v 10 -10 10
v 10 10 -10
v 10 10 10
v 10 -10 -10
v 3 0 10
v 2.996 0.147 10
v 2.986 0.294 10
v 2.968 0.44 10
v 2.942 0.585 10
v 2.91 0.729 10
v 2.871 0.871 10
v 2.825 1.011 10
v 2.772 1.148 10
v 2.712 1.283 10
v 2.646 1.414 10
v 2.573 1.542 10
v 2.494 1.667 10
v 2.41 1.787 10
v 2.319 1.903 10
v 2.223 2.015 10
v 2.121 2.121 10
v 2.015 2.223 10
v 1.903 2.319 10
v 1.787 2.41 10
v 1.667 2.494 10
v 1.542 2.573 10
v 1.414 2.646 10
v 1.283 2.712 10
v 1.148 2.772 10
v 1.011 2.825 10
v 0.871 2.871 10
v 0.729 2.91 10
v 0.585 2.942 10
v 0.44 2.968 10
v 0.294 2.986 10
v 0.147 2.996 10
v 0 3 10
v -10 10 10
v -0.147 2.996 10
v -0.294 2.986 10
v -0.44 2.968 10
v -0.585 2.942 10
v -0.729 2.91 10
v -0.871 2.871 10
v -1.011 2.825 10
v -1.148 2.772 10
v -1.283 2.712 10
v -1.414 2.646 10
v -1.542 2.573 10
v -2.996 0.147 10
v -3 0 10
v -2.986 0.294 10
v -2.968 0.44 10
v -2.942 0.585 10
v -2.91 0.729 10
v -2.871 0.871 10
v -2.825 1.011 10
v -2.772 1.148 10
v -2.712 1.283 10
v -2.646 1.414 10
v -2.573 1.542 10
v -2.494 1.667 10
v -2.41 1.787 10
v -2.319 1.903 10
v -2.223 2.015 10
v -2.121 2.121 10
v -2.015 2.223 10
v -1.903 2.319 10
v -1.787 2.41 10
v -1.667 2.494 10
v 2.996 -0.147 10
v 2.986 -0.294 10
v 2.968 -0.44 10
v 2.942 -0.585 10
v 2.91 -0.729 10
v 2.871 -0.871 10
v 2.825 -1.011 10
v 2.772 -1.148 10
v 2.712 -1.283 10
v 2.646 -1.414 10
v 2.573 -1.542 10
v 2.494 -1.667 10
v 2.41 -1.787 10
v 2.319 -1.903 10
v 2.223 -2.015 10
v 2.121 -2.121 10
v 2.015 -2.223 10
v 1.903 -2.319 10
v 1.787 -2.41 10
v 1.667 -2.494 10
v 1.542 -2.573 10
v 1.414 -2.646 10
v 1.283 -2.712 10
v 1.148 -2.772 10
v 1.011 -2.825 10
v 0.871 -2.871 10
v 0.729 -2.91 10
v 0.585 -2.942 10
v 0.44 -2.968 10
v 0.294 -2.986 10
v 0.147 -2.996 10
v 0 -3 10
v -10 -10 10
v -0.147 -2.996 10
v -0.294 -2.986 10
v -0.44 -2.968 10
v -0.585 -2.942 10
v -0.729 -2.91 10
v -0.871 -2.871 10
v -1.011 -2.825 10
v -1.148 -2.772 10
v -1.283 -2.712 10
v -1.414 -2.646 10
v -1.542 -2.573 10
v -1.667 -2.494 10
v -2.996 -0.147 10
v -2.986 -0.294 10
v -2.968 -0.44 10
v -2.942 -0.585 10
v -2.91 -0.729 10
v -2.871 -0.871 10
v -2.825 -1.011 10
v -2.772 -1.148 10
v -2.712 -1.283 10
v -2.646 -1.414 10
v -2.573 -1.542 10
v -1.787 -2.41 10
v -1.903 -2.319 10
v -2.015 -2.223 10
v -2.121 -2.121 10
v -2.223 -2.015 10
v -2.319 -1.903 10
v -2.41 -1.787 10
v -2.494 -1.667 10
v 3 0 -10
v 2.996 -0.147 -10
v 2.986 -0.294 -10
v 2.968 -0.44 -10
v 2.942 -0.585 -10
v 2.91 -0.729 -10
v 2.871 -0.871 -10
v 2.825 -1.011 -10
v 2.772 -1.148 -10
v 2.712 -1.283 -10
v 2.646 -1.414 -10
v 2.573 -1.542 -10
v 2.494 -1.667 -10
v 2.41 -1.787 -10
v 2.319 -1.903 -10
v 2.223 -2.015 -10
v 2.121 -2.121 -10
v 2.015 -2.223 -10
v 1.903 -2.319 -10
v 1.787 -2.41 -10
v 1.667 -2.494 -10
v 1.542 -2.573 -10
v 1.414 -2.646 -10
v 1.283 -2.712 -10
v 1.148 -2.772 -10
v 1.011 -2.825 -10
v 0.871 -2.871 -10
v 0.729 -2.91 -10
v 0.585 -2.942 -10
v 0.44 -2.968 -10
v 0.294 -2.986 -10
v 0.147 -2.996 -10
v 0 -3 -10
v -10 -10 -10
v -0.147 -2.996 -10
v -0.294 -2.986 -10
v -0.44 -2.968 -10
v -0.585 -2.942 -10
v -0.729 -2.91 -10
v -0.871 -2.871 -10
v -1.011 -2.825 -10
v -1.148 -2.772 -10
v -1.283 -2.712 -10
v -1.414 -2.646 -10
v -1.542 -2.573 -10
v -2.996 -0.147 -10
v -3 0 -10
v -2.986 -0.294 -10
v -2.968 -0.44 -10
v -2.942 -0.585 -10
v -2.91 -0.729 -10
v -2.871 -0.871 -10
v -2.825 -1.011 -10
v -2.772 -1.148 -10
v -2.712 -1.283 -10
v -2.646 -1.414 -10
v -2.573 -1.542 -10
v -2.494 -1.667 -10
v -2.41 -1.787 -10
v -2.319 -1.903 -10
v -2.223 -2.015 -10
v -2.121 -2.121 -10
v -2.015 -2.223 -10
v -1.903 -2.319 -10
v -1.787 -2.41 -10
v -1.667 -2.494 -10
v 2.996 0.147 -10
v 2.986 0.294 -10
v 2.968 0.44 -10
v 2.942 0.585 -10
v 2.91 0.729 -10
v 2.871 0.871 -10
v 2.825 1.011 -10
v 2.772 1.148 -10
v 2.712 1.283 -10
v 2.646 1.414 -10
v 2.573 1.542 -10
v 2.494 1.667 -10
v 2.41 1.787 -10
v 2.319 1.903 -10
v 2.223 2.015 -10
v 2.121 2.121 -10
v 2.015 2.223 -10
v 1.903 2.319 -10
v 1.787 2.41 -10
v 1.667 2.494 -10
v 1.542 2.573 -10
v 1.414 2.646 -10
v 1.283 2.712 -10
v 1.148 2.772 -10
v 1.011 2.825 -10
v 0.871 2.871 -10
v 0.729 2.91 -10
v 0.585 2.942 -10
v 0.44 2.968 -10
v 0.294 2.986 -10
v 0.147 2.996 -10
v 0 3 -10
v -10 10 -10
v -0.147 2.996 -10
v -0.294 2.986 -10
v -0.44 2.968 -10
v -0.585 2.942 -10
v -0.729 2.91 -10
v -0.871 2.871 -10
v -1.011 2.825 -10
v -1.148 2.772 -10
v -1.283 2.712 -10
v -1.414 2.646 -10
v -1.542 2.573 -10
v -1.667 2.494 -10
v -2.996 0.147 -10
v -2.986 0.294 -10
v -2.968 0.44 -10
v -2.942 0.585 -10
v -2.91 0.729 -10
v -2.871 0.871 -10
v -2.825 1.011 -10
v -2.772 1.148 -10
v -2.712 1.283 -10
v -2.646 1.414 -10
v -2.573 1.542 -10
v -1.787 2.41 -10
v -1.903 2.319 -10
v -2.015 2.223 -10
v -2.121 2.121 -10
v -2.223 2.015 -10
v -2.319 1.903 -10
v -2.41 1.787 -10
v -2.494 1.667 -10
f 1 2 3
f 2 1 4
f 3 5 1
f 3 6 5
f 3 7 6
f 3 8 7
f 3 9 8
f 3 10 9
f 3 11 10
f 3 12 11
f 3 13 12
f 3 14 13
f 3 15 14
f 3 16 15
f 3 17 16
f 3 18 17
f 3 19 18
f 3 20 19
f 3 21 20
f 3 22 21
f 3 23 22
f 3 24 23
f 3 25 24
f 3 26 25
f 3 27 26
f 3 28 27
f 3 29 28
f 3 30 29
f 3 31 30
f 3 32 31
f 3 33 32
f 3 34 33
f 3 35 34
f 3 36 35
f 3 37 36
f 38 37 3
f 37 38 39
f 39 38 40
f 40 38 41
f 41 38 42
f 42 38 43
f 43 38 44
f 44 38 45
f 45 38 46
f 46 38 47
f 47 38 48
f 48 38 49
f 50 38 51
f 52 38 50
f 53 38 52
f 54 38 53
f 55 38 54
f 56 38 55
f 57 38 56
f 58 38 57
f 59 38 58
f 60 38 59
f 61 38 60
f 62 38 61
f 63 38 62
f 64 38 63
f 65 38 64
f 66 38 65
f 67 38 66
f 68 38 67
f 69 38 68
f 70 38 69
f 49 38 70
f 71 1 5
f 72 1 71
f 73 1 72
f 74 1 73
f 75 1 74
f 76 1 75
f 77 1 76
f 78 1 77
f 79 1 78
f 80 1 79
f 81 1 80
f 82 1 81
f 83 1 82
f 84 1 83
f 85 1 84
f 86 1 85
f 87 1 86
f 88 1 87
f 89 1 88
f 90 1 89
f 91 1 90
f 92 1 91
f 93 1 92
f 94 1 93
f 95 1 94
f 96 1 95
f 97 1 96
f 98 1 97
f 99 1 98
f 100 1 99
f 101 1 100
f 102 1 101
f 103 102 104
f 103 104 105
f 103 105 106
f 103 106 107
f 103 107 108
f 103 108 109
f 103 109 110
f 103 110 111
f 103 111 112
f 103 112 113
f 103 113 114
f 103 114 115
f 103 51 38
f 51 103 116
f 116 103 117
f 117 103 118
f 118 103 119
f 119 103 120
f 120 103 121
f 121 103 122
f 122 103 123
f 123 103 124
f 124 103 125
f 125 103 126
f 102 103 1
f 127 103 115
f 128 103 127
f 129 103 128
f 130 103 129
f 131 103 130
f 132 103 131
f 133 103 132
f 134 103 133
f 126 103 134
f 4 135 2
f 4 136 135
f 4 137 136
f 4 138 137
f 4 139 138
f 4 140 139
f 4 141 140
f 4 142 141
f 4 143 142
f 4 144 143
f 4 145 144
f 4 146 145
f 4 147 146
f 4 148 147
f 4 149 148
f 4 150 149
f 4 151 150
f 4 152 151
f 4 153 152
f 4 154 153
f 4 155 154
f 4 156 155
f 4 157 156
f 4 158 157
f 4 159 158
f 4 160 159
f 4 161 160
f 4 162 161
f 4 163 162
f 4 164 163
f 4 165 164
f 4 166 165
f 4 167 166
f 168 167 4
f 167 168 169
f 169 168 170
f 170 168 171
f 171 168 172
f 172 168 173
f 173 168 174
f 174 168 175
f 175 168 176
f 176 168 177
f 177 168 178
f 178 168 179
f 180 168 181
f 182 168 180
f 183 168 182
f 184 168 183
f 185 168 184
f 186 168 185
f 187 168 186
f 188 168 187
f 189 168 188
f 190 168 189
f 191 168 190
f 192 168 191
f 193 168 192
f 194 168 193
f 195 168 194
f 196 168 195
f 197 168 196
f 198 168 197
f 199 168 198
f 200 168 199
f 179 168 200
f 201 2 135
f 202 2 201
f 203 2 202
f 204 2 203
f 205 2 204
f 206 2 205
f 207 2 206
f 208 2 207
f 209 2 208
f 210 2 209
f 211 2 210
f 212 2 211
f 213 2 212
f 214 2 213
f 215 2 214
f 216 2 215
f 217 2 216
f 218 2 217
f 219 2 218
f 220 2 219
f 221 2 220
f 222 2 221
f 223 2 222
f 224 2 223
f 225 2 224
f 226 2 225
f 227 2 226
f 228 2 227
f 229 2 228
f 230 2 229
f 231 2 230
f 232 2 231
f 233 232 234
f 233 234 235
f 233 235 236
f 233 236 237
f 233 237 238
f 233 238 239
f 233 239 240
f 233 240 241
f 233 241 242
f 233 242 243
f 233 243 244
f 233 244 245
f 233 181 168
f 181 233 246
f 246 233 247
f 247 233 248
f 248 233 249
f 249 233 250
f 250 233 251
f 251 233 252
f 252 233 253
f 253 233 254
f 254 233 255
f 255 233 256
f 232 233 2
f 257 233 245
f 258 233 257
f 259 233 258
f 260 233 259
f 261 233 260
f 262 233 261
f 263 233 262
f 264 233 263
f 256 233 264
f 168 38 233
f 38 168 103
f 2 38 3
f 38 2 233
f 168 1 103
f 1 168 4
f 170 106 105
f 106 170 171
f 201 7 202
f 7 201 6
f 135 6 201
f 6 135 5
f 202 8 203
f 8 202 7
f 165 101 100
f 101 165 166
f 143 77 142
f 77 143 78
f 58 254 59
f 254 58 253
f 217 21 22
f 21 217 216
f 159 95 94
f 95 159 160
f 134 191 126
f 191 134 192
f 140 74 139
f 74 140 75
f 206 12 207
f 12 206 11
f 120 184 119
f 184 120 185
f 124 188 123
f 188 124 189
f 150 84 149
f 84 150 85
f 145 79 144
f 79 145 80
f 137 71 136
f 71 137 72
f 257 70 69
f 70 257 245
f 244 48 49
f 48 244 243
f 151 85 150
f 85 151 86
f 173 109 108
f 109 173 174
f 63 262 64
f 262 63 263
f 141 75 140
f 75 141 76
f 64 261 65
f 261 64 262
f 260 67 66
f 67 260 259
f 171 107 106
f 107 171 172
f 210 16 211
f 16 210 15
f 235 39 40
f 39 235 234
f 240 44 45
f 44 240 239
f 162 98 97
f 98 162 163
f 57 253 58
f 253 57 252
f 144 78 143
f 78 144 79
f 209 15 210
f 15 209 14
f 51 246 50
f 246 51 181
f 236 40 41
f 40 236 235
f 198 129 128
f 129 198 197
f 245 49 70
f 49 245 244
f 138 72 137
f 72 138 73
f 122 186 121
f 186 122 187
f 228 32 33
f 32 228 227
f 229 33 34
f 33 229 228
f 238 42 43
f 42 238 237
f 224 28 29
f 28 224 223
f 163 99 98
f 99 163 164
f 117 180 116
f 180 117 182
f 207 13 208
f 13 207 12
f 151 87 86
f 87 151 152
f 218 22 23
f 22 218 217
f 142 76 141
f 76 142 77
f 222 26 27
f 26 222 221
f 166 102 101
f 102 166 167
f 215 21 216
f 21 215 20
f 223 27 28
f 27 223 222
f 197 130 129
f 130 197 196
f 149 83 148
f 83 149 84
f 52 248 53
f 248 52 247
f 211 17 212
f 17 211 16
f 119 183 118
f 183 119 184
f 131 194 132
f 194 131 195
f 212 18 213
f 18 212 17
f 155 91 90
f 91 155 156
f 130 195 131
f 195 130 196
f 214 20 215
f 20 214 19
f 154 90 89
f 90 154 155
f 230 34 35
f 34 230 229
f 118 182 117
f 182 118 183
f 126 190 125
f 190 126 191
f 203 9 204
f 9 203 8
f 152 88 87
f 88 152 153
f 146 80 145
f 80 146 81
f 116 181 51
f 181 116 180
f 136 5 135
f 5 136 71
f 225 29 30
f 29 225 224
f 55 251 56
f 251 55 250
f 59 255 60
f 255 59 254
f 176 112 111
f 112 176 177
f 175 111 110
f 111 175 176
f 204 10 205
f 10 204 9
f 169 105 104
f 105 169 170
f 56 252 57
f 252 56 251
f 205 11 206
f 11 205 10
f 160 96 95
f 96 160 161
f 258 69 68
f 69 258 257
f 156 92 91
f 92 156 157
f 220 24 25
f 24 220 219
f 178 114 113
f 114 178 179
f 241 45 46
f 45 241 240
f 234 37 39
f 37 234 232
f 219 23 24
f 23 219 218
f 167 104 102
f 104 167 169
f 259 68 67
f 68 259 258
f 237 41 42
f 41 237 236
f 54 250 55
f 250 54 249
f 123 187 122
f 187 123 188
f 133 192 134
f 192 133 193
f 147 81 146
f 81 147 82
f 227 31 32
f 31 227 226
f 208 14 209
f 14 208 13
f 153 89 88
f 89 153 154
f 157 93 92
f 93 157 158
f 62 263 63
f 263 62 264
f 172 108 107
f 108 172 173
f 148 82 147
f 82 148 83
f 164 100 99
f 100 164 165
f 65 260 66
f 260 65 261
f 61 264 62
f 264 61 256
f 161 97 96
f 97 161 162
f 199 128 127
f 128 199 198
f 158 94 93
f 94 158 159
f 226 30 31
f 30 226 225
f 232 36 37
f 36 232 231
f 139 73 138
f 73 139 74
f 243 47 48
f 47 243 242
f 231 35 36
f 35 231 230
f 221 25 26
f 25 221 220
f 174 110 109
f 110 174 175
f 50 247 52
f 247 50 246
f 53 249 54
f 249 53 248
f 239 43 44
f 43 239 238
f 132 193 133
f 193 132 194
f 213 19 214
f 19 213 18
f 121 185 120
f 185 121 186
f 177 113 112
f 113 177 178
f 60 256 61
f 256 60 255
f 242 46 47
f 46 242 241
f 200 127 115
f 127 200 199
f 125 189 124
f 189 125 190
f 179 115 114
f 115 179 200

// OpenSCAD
// Test cube: parametric box with a through hole.
// Generated by SCADBridge from the SolidCraft feature timeline.
// Units: mm

$fn = 128;

size = 20; // mm
hole = 6; // mm

module body_cube() {
  difference() {
    translate([(0) - (size) / 2, (0) - (size) / 2, (0) - (size) / 2]) {
      cube([size, size, size], center = false);
    }
    translate([0, 0, -(size/2) - 1]) {
      cylinder(h = size + 2, r = (hole) / 2, center = false, $fn = 128);
    }
  }
}

module part() {
  union() {
    body_cube();
  }
}

part();
